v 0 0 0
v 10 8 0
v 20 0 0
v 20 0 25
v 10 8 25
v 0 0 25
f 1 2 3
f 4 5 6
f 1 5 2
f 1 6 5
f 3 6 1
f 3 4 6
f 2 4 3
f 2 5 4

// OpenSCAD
$fn = 48;


linear_extrude(height = 25) {
	polygon(points = [[0, 0], [20, 0], [10.0000000000, 8]]);
}
